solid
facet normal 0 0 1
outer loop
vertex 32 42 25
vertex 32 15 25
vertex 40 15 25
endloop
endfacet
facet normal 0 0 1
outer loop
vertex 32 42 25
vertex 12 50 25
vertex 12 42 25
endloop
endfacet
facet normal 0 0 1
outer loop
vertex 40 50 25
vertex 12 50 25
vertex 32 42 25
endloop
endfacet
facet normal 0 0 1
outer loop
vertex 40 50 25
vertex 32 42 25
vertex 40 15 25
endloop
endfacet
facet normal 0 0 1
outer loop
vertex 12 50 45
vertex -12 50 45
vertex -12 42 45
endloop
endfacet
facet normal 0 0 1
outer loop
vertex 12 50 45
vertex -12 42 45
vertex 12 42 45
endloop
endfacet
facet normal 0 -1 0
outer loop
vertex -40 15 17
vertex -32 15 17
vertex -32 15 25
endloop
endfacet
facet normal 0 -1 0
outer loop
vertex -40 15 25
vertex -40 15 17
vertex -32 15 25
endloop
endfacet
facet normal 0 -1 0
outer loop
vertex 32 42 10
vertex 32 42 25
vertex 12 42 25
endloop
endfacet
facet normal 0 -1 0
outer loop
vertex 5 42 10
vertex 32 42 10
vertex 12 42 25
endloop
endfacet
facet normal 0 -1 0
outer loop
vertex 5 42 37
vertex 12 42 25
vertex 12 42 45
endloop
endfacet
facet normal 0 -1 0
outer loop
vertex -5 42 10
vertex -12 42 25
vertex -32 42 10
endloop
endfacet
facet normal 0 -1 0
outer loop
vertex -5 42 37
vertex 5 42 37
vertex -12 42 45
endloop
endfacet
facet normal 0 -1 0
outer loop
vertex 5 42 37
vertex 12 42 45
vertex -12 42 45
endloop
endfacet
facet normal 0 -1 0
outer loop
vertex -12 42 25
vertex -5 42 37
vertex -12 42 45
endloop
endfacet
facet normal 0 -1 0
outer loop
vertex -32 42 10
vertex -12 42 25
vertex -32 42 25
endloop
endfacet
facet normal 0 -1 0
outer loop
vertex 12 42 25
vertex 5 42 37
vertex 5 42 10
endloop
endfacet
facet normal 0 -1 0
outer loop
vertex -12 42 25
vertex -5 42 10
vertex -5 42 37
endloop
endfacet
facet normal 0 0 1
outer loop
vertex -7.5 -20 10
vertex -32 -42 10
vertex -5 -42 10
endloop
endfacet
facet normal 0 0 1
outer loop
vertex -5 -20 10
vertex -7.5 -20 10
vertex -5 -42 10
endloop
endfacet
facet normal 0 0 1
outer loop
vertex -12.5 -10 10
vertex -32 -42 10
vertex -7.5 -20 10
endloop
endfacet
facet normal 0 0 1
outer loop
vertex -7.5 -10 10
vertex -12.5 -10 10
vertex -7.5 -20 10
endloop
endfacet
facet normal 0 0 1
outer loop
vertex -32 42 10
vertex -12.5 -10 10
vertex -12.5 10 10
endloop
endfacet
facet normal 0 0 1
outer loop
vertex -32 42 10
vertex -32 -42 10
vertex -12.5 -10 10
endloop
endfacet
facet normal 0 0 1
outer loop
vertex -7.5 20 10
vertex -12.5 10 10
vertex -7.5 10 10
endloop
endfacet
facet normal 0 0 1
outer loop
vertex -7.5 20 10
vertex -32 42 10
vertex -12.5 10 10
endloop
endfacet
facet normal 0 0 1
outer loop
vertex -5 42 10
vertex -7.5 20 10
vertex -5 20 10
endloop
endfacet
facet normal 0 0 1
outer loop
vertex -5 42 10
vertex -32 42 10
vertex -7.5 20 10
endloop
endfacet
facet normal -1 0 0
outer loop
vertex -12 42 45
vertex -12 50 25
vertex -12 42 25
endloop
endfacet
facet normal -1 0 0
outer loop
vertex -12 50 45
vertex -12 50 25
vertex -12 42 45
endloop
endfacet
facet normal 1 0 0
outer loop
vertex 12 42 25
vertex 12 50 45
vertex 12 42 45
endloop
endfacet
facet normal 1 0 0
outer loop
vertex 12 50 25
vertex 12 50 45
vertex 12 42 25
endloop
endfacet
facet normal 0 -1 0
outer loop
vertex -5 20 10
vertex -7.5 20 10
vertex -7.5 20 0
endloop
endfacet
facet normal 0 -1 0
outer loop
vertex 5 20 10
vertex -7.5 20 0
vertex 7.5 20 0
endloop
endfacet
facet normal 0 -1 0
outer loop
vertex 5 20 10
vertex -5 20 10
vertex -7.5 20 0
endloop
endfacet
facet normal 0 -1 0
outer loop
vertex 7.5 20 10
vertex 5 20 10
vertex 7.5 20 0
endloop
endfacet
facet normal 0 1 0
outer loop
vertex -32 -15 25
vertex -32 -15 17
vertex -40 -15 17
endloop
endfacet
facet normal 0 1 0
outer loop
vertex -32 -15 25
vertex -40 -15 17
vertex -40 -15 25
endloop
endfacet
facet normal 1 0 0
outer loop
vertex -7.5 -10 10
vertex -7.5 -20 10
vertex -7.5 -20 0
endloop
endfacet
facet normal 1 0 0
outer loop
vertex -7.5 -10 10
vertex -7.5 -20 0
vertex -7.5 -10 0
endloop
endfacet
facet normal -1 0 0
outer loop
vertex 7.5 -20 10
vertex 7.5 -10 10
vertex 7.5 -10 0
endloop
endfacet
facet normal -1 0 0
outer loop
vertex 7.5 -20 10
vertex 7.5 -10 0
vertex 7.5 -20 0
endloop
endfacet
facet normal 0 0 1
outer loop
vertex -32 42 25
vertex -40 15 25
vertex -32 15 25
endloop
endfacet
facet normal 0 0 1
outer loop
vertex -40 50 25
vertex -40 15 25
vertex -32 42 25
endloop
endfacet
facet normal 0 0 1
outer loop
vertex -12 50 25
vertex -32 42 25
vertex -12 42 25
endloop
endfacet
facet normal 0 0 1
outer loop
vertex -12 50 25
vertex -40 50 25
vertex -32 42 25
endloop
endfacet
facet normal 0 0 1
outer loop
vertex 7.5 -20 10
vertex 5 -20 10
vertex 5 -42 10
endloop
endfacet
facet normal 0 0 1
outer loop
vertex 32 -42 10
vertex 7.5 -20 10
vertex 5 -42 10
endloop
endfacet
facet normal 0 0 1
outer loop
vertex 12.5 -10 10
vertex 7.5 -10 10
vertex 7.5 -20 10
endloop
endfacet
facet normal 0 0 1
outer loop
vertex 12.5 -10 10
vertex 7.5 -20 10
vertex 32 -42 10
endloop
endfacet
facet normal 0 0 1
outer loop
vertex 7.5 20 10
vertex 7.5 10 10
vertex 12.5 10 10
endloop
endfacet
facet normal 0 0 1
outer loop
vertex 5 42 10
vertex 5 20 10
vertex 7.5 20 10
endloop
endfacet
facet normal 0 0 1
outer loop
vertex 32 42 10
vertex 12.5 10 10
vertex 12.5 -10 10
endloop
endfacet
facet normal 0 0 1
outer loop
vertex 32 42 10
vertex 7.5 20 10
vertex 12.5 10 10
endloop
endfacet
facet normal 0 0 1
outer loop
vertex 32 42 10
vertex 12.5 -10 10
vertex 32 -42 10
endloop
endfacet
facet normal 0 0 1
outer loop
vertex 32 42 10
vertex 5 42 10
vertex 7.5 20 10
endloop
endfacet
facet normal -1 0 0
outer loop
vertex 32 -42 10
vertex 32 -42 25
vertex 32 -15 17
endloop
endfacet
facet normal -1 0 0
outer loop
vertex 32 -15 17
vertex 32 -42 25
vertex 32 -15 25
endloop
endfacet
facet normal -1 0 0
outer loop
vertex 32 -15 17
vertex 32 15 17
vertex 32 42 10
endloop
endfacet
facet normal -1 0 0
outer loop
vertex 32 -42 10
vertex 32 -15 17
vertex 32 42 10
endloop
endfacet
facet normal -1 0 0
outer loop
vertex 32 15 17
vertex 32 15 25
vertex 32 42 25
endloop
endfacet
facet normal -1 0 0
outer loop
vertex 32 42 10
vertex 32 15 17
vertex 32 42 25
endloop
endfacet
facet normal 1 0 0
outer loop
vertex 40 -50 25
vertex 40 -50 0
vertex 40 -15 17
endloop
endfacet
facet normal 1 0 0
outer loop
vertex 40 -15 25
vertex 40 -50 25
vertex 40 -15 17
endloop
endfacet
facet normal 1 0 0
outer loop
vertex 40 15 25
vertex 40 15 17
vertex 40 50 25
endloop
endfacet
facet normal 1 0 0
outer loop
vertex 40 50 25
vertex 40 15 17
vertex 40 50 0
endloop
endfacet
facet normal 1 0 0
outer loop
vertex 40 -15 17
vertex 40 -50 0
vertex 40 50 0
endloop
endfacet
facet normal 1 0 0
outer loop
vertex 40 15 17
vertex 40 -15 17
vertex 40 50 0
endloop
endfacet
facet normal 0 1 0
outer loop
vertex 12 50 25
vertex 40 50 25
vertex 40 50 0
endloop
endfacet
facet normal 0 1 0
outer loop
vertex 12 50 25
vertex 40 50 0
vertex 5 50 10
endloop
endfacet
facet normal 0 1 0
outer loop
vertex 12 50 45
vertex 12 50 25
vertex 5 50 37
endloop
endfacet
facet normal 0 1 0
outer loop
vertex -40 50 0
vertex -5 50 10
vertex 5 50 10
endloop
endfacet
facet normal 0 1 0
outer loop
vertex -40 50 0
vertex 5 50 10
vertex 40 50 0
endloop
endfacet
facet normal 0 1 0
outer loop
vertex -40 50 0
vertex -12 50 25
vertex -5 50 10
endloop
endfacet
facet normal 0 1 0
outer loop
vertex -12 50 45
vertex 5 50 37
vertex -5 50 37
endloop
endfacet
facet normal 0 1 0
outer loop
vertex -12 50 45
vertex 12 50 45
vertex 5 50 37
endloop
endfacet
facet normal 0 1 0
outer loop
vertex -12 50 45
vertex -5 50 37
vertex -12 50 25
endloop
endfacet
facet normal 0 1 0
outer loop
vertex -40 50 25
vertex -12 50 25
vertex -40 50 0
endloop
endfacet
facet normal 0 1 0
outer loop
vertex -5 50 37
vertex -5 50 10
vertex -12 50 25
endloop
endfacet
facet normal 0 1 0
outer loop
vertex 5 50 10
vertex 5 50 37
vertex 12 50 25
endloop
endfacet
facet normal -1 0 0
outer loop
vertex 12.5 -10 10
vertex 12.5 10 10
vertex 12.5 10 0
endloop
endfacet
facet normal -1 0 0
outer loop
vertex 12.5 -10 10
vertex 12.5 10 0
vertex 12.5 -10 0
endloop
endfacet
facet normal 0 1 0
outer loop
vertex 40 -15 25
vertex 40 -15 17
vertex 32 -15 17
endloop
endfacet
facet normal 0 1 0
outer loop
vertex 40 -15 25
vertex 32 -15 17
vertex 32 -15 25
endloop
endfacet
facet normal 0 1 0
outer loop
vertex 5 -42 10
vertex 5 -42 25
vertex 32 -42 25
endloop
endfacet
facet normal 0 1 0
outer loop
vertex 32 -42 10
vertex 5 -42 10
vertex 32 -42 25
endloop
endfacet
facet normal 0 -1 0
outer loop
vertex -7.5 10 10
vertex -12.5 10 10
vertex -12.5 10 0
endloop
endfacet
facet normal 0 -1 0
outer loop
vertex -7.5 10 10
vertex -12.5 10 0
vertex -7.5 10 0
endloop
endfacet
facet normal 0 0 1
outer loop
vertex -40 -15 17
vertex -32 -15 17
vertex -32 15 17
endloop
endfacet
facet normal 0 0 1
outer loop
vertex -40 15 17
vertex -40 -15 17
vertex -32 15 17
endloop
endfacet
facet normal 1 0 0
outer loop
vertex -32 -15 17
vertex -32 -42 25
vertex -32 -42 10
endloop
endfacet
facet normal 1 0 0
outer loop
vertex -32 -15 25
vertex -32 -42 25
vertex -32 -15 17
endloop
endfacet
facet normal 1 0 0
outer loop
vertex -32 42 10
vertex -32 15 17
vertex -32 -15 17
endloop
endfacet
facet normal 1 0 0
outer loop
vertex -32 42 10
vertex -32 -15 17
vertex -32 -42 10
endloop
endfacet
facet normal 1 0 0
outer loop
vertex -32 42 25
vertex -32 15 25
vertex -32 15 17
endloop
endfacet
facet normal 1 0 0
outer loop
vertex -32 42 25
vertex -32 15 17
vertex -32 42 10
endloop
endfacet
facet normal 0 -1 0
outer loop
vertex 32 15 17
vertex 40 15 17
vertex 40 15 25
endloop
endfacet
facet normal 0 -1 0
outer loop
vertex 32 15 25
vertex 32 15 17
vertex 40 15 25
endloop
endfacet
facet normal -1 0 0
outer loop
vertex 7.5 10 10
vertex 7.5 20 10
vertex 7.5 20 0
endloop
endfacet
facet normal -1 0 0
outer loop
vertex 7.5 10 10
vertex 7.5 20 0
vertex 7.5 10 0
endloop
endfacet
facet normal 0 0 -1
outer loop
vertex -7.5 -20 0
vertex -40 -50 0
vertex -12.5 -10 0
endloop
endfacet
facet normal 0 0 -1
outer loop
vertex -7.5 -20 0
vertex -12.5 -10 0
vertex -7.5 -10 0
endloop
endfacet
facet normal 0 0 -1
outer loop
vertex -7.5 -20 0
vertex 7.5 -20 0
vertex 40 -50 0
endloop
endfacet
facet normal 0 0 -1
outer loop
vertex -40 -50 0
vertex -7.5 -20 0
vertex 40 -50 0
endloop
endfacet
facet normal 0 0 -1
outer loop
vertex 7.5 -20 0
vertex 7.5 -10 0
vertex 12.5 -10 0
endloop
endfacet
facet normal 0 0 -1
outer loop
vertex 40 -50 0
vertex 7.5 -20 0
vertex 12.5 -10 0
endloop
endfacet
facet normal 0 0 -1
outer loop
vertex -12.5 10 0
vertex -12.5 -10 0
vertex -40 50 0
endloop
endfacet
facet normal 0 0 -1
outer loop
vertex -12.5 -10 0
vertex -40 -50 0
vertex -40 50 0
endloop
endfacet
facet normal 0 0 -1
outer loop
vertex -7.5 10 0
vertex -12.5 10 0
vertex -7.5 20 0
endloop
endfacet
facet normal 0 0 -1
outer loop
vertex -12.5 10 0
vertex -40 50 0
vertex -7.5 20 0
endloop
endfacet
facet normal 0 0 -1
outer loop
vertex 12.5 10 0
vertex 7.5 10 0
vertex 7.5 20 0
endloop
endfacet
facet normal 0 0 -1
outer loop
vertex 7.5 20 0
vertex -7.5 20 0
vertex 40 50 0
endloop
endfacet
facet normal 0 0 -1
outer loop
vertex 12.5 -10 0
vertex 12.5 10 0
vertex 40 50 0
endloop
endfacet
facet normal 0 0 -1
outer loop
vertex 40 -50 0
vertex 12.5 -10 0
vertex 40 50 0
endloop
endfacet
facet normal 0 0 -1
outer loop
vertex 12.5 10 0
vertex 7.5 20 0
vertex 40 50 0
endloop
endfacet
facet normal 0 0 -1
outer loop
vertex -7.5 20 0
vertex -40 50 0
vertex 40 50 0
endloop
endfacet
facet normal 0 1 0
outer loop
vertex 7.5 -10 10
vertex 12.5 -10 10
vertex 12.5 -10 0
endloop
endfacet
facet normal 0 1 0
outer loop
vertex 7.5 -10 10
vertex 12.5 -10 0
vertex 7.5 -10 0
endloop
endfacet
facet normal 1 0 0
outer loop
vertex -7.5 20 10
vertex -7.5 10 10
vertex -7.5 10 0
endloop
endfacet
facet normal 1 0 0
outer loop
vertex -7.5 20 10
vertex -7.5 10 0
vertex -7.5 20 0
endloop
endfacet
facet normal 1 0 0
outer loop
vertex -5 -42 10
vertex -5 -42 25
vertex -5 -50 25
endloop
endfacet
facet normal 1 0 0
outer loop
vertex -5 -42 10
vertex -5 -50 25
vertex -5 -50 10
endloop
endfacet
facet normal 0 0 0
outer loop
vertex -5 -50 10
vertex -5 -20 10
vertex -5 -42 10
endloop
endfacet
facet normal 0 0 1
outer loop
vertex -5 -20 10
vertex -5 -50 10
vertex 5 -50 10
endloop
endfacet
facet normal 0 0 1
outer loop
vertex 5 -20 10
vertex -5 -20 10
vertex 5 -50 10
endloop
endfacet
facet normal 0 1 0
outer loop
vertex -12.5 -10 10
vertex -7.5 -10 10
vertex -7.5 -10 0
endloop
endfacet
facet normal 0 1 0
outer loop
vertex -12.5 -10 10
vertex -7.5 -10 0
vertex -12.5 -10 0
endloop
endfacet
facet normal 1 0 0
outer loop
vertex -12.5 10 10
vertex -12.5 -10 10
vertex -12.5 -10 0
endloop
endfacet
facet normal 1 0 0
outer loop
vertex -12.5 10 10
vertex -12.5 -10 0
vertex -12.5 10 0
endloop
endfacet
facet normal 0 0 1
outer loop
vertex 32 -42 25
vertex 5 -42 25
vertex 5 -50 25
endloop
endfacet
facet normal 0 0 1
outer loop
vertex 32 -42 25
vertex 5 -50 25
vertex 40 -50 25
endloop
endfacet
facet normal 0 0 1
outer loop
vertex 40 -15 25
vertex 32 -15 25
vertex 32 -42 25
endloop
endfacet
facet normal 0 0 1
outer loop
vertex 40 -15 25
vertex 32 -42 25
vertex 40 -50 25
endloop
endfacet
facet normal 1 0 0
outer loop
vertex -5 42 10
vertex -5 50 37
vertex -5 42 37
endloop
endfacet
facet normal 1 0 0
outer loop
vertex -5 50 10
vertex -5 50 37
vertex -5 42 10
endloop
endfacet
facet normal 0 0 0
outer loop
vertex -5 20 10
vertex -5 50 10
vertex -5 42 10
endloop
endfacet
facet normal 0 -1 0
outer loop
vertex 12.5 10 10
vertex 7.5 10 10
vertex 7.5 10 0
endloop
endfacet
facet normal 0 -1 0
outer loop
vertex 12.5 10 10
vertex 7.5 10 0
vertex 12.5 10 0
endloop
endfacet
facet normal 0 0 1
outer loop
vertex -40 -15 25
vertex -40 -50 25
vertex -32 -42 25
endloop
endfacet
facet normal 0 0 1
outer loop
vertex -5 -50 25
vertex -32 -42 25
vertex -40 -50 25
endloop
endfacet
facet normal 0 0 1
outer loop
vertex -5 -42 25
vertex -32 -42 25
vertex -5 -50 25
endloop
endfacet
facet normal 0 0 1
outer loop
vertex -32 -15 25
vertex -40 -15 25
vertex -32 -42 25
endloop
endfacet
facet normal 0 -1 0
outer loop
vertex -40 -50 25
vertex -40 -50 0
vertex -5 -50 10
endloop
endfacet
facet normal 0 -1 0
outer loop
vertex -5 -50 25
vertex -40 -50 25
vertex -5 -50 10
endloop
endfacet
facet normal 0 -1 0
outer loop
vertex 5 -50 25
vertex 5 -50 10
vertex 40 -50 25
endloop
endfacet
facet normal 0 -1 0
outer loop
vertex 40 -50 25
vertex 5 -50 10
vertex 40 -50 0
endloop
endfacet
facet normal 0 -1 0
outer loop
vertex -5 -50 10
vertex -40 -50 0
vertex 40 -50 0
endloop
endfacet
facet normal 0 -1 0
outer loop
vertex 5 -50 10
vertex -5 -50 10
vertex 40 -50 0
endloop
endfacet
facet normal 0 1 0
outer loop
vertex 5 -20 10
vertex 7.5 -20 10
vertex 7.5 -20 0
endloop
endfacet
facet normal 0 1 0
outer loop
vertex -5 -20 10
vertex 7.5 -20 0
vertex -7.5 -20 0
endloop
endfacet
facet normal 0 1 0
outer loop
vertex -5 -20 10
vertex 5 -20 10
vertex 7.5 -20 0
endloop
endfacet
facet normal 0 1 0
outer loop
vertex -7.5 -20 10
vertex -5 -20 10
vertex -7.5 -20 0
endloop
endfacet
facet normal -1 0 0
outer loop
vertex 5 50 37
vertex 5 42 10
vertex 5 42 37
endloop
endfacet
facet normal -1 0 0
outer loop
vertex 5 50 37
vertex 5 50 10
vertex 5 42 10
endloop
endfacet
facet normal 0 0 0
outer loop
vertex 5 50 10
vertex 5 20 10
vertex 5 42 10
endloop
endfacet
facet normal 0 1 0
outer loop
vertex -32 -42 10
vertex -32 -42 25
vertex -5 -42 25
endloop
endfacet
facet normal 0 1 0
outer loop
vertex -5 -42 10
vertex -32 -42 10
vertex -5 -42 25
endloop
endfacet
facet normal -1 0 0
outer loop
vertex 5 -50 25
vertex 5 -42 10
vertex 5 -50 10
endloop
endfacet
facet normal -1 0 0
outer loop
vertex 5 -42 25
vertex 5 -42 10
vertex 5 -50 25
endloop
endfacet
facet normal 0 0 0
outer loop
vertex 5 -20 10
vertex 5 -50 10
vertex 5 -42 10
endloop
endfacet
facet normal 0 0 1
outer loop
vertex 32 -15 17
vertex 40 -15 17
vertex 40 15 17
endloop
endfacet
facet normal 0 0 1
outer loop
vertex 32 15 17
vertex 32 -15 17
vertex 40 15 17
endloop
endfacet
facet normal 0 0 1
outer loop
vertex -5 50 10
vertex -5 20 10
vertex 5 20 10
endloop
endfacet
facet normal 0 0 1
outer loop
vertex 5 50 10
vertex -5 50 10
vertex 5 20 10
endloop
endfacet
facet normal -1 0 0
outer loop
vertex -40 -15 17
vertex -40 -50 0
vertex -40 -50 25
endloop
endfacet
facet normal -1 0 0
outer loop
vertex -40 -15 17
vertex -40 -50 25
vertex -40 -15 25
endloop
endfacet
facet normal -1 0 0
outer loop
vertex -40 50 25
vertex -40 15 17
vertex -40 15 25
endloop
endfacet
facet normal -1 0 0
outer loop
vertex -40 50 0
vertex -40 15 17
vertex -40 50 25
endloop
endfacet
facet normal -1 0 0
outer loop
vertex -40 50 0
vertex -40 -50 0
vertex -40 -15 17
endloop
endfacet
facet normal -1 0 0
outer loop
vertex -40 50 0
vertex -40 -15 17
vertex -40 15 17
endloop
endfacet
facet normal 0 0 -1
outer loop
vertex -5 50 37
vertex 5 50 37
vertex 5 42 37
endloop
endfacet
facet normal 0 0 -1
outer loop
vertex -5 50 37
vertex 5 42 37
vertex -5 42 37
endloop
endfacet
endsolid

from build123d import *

# Parameters (mm, degrees)
SKETCH_W        = 80
SKETCH_H        = 100
PAD_DEPTH       = 25
SKETCH001_W     = 64
SKETCH001_H     = 84
POCKET_DEPTH    = 15
SKETCH002_W     = 10
SKETCH002_H     = 27.891991
POCKET001_DEPTH = 100.001
SKETCH003_W     = 30
SKETCH003_H     = 18.544697
POCKET002_DEPTH = 80.001
PAD001_DEPTH    = 8
POCKET003_DEPTH = 10


with BuildPart() as part:
    # Sketch → Pad (new body)
    with BuildSketch(Plane.XY):
        Rectangle(SKETCH_W, SKETCH_H)
    extrude(amount=PAD_DEPTH)

    # Sketch001 → Pocket (cut)
    with BuildSketch(Plane.XY.offset(25)):
        Rectangle(SKETCH001_W, SKETCH001_H)
    extrude(amount=-POCKET_DEPTH, mode=Mode.SUBTRACT)

    # Sketch002 → Pocket001 (cut, through all)
    with BuildSketch(Plane.XZ.offset(50)):
        with Locations((0, 23.945995)):
            Rectangle(SKETCH002_W, SKETCH002_H)
    extrude(amount=-POCKET001_DEPTH, mode=Mode.SUBTRACT)

    # Sketch003 → Pocket002 (cut, through all)
    with BuildSketch(Plane.YZ.offset(40)):
        with Locations((0, 26.272348)):
            Rectangle(SKETCH003_W, SKETCH003_H)
    extrude(amount=-POCKET002_DEPTH, mode=Mode.SUBTRACT)

    # Sketch004 → Pad001 (new body)
    with BuildSketch(Plane(origin=(0, 50, 0), x_dir=(-1, 0, 0), z_dir=(0, 1, 0))):
        Polygon((12, 25), (12, 45), (-12, 45), (-12, 25), (-5, 25), (-5, 37), (5, 37), (5, 25), align=None)
    extrude(amount=-PAD001_DEPTH)

    # Sketch005 → Pocket003 (cut)
    with BuildSketch(Plane.XY.offset(10)):
        Polygon((-7.5, 10), (-7.5, 20), (7.5, 20), (7.5, 10), (12.5, 10), (12.5, -10), (7.5, -10), (7.5, -20), (-7.5, -20), (-7.5, -10), (-12.5, -10), (-12.5, 10), align=None)
    extrude(amount=-POCKET003_DEPTH, mode=Mode.SUBTRACT)


solid = part.part
